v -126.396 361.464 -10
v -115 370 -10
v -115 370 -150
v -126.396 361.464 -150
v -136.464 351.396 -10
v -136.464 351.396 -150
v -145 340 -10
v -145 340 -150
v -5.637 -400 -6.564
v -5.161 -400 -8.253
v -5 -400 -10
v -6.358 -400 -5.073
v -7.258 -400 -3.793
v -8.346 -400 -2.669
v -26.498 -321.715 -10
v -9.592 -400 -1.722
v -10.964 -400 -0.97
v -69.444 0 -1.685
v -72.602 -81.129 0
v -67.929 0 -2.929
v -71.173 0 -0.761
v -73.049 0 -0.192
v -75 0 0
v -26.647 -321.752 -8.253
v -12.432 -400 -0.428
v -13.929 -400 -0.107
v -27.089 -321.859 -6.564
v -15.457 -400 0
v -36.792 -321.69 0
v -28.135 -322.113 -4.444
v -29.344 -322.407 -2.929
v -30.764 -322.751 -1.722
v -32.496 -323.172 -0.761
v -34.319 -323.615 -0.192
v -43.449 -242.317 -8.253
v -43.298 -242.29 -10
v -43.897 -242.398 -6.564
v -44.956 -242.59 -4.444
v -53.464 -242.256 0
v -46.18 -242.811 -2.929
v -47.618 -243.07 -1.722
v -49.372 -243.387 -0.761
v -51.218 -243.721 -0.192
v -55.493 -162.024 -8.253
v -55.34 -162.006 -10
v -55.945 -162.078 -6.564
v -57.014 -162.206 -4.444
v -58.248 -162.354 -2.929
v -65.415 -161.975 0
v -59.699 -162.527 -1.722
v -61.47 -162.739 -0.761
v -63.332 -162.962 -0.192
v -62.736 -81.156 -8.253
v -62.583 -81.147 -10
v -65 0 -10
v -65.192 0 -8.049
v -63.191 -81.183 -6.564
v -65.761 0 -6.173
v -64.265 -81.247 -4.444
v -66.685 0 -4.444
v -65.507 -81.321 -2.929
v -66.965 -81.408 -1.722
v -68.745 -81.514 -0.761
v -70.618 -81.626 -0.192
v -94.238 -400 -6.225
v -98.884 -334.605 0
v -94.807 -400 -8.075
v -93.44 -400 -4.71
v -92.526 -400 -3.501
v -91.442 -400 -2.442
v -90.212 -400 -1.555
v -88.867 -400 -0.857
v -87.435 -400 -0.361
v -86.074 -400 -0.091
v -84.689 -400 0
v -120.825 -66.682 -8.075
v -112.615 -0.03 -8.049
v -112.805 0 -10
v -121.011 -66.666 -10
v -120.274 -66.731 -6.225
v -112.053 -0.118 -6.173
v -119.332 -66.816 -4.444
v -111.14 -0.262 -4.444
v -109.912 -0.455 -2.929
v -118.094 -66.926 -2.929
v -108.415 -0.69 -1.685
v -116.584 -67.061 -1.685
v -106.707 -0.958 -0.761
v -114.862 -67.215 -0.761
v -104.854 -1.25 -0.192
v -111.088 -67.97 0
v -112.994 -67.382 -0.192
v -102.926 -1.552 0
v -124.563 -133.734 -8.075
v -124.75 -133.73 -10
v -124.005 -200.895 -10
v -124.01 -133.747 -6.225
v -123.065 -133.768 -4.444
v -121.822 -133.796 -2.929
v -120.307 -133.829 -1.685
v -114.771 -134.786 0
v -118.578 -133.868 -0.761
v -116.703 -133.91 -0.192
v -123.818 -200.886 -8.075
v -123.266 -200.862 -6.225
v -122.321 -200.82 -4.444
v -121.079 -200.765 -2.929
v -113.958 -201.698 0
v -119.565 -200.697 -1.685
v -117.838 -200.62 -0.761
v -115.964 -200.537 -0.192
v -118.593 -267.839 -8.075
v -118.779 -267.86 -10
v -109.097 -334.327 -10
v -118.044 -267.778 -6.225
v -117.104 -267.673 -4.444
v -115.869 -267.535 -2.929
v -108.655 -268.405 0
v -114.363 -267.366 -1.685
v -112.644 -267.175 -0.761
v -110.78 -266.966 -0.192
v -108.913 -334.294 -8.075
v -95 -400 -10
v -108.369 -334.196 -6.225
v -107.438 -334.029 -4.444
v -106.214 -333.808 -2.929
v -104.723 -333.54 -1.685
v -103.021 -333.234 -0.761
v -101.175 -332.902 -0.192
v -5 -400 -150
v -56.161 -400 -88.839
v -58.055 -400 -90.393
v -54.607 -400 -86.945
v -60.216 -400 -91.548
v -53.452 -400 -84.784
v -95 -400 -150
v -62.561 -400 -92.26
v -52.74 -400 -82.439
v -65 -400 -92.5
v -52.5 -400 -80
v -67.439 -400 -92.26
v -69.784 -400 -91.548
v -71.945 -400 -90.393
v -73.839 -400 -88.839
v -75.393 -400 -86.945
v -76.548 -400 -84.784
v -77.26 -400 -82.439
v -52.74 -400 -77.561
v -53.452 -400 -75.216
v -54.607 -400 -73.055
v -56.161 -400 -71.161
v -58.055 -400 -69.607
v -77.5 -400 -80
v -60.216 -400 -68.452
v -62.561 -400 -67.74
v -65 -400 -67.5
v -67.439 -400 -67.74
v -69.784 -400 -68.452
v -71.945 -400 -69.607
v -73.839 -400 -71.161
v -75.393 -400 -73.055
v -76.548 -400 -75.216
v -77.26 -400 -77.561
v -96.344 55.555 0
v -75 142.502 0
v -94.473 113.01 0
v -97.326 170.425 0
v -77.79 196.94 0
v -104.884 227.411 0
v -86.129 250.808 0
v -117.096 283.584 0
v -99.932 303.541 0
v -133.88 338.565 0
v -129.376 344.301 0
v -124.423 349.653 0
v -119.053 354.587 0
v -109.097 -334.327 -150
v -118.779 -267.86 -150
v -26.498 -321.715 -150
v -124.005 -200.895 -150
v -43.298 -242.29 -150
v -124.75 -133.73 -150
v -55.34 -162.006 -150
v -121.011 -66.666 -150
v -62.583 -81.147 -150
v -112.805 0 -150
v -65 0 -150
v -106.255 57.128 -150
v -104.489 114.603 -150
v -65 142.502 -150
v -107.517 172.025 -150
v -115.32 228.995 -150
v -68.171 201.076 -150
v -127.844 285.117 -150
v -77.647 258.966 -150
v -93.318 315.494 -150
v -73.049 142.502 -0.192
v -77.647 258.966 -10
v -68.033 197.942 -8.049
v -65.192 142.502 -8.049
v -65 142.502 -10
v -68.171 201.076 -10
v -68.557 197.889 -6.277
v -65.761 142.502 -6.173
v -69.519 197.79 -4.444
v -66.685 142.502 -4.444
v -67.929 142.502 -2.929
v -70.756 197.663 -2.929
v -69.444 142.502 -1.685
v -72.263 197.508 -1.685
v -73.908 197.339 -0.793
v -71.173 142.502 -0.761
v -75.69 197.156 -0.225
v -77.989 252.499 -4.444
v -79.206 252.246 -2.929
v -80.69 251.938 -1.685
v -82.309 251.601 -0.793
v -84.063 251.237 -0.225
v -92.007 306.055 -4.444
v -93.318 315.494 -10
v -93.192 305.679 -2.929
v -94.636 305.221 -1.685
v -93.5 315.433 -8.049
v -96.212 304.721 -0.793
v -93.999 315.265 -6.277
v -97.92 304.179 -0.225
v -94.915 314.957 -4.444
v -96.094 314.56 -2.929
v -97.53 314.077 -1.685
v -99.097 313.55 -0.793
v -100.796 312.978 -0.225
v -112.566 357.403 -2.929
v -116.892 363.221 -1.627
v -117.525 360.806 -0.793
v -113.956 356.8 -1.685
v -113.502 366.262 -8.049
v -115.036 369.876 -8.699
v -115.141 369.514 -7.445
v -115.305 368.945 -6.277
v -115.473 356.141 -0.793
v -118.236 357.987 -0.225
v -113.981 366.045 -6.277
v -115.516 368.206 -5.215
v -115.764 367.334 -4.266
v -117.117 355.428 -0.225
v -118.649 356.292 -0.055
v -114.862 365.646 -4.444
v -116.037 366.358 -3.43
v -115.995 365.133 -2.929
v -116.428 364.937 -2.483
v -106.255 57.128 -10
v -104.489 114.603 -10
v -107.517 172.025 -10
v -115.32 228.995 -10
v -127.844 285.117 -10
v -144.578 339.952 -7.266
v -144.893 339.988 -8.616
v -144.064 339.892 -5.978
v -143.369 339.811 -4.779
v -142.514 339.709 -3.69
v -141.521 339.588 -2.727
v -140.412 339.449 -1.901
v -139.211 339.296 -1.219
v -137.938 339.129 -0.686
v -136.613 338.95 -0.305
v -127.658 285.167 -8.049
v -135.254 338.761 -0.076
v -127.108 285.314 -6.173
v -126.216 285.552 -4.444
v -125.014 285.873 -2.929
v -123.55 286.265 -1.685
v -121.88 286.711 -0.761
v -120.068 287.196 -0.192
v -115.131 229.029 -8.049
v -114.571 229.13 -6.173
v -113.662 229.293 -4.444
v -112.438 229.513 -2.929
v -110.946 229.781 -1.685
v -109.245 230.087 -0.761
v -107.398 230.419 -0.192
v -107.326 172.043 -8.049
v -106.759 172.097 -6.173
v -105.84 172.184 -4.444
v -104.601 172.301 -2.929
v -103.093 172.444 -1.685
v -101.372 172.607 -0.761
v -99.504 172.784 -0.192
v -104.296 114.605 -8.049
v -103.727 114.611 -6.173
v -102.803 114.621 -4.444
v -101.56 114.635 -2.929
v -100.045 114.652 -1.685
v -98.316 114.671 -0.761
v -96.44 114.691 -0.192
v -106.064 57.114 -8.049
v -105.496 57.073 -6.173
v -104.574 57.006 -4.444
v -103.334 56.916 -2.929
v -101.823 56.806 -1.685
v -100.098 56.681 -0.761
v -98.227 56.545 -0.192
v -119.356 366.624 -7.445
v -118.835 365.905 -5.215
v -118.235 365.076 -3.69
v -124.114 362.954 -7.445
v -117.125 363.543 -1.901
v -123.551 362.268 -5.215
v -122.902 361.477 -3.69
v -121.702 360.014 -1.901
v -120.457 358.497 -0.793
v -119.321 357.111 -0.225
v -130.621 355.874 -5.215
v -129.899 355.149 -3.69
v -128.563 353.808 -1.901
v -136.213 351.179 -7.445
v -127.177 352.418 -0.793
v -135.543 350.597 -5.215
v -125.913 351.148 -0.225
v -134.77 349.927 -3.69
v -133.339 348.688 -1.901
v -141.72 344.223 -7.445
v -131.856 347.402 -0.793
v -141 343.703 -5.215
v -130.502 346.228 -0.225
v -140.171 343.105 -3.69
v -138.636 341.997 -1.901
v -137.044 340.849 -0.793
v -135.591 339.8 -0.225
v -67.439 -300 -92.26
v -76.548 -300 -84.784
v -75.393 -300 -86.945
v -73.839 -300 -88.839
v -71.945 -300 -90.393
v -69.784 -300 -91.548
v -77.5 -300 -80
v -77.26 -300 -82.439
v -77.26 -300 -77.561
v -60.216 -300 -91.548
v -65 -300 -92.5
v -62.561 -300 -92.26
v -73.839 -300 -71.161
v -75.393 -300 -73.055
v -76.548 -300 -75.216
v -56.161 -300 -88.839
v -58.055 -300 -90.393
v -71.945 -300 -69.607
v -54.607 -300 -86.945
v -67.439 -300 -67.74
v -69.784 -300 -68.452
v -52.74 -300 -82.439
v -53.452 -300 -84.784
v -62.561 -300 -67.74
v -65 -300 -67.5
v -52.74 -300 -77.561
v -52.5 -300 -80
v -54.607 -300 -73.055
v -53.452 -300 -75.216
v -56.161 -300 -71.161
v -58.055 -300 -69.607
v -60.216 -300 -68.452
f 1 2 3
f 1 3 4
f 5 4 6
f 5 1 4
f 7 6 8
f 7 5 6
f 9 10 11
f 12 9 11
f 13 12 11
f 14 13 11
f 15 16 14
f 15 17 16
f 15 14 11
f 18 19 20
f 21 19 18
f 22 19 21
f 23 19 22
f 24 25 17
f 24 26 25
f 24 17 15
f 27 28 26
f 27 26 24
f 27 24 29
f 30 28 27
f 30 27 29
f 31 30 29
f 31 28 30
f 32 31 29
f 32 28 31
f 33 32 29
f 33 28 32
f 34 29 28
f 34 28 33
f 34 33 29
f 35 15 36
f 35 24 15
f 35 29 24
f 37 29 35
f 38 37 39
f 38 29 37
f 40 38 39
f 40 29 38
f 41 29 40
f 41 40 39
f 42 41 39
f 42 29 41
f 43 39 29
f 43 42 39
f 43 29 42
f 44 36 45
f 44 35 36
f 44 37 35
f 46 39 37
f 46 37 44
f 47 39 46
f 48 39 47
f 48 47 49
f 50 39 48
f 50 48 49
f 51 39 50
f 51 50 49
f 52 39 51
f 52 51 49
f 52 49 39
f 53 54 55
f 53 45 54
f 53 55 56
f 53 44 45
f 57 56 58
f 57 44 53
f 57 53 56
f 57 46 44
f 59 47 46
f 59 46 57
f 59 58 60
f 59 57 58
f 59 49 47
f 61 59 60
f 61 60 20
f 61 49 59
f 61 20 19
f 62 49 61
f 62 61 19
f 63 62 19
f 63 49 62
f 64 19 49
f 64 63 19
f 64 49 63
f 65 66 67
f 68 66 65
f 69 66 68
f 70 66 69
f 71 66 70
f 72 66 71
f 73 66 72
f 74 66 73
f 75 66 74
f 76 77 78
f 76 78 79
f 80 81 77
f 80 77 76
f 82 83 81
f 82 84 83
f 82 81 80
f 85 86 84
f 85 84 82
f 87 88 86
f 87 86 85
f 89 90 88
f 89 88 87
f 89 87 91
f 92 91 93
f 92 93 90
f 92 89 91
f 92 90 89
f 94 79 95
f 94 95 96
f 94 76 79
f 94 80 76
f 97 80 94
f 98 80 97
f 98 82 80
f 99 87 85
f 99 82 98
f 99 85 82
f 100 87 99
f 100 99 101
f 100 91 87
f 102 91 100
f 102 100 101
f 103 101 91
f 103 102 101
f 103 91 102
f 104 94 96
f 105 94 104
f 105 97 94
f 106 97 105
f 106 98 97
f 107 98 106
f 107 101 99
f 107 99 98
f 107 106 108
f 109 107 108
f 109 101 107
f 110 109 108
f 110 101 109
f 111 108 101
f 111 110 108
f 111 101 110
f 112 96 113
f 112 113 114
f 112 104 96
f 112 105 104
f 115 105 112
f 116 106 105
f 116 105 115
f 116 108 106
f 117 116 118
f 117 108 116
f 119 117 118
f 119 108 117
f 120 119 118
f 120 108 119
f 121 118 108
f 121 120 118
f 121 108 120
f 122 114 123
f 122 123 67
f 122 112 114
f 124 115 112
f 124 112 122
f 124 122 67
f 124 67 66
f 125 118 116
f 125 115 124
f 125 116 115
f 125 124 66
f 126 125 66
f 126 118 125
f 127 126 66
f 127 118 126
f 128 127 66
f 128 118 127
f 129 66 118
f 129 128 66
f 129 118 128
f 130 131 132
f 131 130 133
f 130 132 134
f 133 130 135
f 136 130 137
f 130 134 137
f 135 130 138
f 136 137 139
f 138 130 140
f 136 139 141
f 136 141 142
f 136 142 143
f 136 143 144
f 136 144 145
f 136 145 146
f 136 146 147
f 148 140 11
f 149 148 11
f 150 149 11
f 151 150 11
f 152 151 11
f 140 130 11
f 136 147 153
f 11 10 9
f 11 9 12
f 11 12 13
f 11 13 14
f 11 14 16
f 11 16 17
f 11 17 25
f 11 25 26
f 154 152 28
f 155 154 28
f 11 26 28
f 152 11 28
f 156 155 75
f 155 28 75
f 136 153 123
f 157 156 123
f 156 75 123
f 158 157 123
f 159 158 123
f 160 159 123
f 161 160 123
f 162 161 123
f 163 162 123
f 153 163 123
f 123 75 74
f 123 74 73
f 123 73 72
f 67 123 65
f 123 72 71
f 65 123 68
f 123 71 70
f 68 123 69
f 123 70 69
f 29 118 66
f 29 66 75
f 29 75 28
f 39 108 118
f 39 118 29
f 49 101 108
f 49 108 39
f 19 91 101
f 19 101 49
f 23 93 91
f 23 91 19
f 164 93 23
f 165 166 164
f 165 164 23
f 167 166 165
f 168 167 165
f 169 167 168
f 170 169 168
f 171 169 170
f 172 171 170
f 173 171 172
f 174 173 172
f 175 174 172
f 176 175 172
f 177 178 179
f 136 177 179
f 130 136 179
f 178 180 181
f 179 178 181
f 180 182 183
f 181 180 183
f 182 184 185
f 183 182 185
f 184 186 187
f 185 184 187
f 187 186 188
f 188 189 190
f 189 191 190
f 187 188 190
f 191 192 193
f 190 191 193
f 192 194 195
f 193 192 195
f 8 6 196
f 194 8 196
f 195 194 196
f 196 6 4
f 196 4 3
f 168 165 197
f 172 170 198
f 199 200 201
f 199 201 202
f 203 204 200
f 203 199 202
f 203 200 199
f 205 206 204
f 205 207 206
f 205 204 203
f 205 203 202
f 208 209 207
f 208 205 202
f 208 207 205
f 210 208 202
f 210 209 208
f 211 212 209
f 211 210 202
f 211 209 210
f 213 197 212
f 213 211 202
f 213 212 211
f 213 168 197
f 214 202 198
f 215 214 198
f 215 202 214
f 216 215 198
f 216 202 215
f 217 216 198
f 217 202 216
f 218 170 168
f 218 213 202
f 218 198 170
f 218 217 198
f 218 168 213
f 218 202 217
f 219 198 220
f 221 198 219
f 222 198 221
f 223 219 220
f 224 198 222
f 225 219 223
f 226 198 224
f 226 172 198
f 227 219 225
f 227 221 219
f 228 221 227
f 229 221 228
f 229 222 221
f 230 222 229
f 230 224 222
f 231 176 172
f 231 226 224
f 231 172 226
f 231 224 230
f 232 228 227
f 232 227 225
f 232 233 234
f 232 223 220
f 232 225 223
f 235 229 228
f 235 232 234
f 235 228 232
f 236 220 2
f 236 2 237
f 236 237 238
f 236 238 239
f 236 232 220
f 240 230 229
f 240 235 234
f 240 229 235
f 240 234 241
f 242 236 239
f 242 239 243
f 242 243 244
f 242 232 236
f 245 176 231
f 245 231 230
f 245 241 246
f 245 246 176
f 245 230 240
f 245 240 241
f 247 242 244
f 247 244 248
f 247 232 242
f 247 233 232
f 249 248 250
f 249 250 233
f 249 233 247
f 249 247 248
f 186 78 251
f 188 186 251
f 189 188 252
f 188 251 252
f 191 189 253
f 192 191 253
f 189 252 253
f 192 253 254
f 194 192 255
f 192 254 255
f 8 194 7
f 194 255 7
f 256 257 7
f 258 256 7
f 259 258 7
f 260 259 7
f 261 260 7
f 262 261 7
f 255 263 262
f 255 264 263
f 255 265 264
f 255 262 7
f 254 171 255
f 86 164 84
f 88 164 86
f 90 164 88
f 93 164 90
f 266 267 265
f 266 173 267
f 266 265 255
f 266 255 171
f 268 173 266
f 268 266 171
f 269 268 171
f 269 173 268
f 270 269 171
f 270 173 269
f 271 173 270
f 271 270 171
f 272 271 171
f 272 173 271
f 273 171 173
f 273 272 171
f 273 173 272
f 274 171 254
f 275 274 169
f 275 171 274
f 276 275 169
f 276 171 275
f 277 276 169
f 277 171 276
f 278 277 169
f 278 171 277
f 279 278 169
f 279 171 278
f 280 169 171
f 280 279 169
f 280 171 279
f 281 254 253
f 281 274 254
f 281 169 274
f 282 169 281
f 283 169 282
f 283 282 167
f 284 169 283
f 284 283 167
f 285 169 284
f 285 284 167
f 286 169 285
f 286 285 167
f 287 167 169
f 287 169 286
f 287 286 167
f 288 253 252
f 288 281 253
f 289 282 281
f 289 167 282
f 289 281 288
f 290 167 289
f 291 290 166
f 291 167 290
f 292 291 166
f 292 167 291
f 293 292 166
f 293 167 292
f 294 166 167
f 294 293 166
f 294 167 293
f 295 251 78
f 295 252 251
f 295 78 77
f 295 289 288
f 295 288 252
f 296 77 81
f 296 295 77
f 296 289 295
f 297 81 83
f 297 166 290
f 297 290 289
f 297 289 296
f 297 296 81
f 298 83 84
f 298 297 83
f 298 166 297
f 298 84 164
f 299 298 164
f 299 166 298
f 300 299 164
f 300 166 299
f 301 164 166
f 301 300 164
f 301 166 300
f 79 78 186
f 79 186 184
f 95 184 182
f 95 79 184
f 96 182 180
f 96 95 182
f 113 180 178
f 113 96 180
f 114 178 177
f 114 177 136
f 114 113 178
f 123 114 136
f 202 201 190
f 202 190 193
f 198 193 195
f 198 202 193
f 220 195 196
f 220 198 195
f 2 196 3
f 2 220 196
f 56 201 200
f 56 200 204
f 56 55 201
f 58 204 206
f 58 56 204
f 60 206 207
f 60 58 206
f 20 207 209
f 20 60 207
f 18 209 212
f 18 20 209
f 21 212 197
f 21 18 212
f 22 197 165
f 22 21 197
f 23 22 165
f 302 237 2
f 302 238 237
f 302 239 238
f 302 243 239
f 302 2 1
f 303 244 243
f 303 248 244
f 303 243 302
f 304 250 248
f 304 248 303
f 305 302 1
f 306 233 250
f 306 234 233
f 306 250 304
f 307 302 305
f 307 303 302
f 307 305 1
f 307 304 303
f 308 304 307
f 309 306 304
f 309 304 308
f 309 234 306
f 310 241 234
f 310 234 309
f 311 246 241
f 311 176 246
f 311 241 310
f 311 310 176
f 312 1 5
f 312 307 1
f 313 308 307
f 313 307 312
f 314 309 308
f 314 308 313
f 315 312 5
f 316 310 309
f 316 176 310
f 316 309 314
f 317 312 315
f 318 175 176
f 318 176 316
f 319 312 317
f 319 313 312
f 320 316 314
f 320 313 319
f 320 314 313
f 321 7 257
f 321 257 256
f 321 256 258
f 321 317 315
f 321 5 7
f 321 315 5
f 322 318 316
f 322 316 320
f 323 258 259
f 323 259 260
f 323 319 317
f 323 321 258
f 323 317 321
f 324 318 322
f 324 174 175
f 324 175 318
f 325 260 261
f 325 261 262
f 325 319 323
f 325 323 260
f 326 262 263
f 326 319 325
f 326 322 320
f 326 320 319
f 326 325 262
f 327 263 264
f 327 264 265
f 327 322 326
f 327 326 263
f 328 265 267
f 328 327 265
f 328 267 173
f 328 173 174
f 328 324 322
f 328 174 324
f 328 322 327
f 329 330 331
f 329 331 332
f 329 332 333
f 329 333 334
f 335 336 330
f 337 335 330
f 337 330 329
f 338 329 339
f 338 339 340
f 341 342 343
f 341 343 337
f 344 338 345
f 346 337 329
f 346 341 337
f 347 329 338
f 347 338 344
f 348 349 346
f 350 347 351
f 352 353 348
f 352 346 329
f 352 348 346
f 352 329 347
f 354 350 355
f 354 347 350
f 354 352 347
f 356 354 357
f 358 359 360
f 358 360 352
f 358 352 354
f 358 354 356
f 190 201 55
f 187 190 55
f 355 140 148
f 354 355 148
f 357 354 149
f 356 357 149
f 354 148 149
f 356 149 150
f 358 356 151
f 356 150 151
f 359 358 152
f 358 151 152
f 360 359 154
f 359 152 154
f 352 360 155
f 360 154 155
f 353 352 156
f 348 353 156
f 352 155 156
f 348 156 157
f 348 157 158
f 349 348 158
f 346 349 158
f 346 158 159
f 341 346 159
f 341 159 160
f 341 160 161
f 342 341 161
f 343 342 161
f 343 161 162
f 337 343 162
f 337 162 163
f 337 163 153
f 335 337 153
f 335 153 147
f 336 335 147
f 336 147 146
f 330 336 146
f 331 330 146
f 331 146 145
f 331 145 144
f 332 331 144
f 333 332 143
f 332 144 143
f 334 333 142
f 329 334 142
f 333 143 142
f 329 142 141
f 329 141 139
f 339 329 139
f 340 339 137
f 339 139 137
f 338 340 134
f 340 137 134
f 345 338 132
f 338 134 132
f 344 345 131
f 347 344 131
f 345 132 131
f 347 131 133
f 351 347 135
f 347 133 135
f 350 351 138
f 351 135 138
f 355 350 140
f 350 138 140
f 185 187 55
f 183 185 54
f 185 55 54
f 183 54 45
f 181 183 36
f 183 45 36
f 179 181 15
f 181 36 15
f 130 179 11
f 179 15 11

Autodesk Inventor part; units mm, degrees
ref_plane "YZ Plane" through (0, 0, 0) normal (1, 0, 0) x (0, 1, 0)
ref_plane "XZ Plane" through (0, 0, 0) normal (0, 1, 0) x (-1, 0, 0)
ref_plane "XY Plane" through (0, 0, 0) normal (0, 0, 1) x (1, 0, 0)
sketch "Skizze3" plane through (0, 0, 0) normal (0, 0, 1) x (1, 0, 0)
  line L0 (-225, 400) -> (225, 400)
  line L1 (225, 400) -> (225, -400)
  line L2 (225, -400) -> (-225, -400)
  line L3 (-225, -400) -> (-225, 400)
  arc A0 (-195.1149, 0) -> (-225, -400) centre (2466.8593, -400) ccw
  arc A1 (-195.1149, 0) -> (-195, 270) centre (-1096.0822, 135.3833) ccw
  arc A2 (225, -400) -> (191.0498, 0) centre (-2148.3658, -400) ccw
  arc A3 (195, 400) -> (191.0498, 0) centre (1296.9948, 189.0977) ccw
  arc A4 (195, 400) -> (-98.428, 330) centre (195, -250) ccw
  arc A5 (-112.8051, 0) -> (-95, -400) centre (880.9564, -156.1612) ccw
  arc A6 (-112.8051, 0) -> (-145, 340) centre (-793.9104, 107.0299) ccw
  arc A7 (-135, 310) -> (-195, 270) centre (195, -250) ccw
  arc A8 (-65, 0) -> (-5, -400) centre (1298.3333, 0) ccw
  arc A9 (-98.428, 330) -> (-135, 310) centre (195, -250) ccw construction
  line L4 (-65, 0) -> (-65, 238.5671) construction
  arc A10 (-65, 142.5015) -> (-115, 370) centre (-607.5556, 142.5015) ccw
  line L5 (-65, 142.5015) -> (-65, 0)
  arc A11 (-115, 370) -> (-145, 340) centre (-60.8986, 285.8986) ccw
  arc A12 (-98.428, 330) -> (-225, 400) centre (-144761.9711, -261097.0223) ccw construction
  arc A13 (175.6814, 150) -> (-98.428, 330) centre (-1149.0878, -1568.6875) ccw construction
  point P0 (0, 0)
  point P1 (-225.0722, 0)
  point P2 (0, 400.05)
  point P3 (-225, 0)
  point P4 (0, 400)
  dimension "d5" = 800
  dimension "d8" = 450
  dimension "d9" = 670
  dimension "d10" = 30
  dimension "d11" = 40
  dimension "d12" = 30
  dimension "d14" = 50
  dimension "d16" = 130
  dimension "d18" = 90
  dimension "d19" = 740
  dimension "d21" = 90
  dimension "d22" = 230
  dimension "d23" = 140
  dimension "d26" = 100
  dimension "d28" = 730
  dimension "d34" = 160
  dimension "d35" = 30
  dimension "d36" = 770
  dimension "d38" = 100
  dimension "d51" = 323.428
  dimension "d52" = 250
  dimension "d53" = 2170
extrude "Extrusion3" add sketch "Skizze3" against normal blind 150 contours A10 L5 A8 L2 A5 A6 A11
fillet "Rundung1" radius 10 8 edges at (-65, 71.2508, 0) (-49.9166, -202.2375, 0) (-106.3148, 350.1654, 0) (-73.4224, 237.729, 0) (-124.0049, -200.8948, 0) (-106.2073, 156.2669, 0) (-139.828, 325.0573, 0) (-131.6093, 356.6093, 0)
sketch "Skizze8" plane through (-95, -400, -150) normal (0, -1, 0) x (1, 0, 0)
  line L0 (0, 140) -> (0, 0) projected
  line L1 (90, 0) -> (0, 0) projected
  circle A0 centre (30, 70) radius 12.5
  point P0 (95, 150)
  dimension "d62" = 25
  dimension "d63" = 70
  dimension "d64" = 30
extrude "Extrusion4" cut sketch "Skizze8" against normal blind 100
properties part number "UA-70 Denkmal2"
